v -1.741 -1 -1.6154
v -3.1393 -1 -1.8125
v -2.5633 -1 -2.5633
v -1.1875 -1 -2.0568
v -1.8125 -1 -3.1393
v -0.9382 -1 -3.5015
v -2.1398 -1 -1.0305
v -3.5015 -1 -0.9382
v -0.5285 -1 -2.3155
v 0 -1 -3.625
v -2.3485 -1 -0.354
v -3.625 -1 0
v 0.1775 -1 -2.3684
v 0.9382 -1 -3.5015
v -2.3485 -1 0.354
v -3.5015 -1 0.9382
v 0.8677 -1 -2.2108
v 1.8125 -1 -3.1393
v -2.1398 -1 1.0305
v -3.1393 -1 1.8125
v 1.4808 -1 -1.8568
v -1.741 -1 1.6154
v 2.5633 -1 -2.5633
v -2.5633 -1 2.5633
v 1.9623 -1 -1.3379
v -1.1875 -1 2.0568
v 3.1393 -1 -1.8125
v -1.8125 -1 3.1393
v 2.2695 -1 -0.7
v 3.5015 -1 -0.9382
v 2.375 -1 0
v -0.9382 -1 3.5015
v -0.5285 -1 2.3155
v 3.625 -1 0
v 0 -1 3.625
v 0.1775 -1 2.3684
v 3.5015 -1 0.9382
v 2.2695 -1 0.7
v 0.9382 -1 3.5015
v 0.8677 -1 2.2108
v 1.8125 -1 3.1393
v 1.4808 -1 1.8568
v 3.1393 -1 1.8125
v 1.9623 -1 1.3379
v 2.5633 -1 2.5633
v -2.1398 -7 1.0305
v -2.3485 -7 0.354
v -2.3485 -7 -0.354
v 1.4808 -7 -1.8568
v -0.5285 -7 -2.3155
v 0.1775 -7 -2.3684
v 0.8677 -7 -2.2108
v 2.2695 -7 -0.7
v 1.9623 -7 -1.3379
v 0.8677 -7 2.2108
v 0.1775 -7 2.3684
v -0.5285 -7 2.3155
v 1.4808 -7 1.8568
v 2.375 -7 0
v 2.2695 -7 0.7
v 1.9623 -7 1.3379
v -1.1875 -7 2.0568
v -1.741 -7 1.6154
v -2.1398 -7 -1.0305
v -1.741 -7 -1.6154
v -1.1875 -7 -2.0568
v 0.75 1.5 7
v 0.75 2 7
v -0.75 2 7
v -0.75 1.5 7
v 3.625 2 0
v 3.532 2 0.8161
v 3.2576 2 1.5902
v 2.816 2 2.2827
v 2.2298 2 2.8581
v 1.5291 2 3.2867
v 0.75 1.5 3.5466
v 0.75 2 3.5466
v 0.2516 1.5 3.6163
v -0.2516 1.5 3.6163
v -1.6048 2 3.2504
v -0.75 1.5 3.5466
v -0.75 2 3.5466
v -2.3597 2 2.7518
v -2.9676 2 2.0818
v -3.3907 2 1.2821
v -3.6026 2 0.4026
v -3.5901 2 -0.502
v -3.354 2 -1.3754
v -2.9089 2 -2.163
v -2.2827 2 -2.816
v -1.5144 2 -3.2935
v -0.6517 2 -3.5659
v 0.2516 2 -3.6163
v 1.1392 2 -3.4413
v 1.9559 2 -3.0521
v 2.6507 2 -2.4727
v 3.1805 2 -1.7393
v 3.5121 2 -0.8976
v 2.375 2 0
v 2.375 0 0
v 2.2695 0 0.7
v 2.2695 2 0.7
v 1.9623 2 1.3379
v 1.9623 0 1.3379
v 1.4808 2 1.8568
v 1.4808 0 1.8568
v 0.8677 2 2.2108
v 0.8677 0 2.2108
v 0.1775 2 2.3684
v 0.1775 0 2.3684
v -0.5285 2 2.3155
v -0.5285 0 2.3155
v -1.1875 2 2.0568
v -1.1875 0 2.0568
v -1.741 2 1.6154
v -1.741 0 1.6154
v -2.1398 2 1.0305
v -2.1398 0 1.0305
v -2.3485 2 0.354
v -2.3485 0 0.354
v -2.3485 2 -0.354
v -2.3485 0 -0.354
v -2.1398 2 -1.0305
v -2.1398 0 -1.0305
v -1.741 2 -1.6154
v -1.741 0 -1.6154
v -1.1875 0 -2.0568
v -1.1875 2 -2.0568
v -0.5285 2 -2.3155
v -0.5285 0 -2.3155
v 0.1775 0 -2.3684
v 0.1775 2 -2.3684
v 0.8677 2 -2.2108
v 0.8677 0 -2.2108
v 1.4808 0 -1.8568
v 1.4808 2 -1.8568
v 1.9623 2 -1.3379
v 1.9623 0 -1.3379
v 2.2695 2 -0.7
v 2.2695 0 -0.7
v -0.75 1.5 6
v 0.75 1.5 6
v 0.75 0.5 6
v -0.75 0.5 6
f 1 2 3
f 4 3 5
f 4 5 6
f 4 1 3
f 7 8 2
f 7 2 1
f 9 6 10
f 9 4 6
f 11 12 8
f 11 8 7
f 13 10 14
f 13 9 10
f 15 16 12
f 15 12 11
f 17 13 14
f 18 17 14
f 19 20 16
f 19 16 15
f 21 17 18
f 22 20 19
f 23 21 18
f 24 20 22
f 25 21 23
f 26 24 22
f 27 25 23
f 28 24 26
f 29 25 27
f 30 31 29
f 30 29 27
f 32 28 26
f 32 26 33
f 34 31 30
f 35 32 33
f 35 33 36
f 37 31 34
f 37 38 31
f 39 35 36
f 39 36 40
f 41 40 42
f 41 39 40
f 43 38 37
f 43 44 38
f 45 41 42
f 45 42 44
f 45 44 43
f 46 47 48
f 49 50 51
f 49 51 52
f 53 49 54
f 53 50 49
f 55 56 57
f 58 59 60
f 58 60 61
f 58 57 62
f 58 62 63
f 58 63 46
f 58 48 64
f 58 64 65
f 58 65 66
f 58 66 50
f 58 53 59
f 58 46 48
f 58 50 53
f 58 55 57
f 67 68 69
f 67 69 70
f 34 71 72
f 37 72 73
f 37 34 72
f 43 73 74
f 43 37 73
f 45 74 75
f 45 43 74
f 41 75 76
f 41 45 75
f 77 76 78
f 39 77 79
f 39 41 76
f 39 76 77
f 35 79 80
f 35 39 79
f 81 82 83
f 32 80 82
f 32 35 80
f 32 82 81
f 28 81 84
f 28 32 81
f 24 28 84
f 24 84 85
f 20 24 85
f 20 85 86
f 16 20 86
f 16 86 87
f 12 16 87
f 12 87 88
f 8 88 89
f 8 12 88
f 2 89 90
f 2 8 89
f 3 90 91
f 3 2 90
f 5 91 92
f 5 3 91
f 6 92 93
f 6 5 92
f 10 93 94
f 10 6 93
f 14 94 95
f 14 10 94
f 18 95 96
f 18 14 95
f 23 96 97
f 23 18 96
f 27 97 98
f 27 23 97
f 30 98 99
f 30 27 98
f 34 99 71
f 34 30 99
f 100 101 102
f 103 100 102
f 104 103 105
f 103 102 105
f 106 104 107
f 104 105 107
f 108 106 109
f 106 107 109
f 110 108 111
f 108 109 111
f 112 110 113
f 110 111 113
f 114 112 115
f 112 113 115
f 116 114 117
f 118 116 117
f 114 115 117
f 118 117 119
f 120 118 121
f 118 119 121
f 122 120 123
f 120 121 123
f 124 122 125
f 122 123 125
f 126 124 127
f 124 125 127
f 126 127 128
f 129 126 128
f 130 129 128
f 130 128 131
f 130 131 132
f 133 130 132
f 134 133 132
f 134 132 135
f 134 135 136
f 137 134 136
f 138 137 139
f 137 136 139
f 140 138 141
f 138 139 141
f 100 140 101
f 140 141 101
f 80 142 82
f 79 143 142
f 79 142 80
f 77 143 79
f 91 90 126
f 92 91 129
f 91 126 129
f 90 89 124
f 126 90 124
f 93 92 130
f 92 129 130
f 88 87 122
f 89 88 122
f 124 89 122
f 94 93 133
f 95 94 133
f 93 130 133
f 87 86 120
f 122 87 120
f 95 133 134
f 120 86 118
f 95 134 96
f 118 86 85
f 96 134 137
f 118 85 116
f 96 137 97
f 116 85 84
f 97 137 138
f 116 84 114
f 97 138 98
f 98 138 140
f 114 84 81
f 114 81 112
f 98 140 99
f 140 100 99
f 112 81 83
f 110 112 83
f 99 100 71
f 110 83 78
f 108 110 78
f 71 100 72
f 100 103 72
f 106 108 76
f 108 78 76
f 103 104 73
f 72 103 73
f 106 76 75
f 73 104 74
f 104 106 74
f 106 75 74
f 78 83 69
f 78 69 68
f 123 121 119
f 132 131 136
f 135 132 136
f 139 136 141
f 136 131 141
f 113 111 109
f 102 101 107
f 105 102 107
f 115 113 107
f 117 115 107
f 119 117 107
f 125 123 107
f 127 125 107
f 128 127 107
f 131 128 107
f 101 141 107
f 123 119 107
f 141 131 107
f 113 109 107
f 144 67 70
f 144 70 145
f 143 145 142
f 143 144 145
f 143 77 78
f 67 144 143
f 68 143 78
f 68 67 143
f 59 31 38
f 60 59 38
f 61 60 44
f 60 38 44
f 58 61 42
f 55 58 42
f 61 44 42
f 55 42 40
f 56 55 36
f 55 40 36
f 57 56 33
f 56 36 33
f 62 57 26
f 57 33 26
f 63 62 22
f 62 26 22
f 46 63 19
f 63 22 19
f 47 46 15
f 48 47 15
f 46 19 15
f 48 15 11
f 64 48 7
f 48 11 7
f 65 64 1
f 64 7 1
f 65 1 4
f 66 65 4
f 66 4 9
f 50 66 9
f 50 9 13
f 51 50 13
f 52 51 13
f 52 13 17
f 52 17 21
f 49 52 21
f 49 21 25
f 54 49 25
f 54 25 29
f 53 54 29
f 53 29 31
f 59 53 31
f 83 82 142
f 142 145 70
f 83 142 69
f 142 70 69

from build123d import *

# Parameters (mm, degrees)
F0_R          = 3.625
F0_R_2        = 2.375
F1_DEPTH      = 1
F1_DEPTH_BACK = 2
F2_DEPTH      = 7
F4_DEPTH      = 0.75


with BuildPart() as f1:
    # F0 (on Front) → F1 (new body, two sides)
    with BuildSketch(Plane.XZ) as f1_sk:
        Circle(F0_R)
        Circle(F0_R_2, mode=Mode.SUBTRACT)
    extrude(amount=F1_DEPTH)
    extrude(f1_sk.sketch, amount=-F1_DEPTH_BACK)

    # F0 (on Front) → F2 (join)
    with BuildSketch(Plane.XZ):
        Circle(F0_R_2)
    extrude(amount=F2_DEPTH)

    # F3 (on Right) → F4 (join, symmetric)
    with BuildSketch(Plane.YZ):
        Polygon((1.5, 3.5), (2, 3.5), (2, 7), (1.5, 7), (1.5, 6), align=None)
        Polygon((0.5, 6), (1.5, 6), (1.5, 7), align=None)
    extrude(amount=F4_DEPTH, both=True)


solid = f1.part
